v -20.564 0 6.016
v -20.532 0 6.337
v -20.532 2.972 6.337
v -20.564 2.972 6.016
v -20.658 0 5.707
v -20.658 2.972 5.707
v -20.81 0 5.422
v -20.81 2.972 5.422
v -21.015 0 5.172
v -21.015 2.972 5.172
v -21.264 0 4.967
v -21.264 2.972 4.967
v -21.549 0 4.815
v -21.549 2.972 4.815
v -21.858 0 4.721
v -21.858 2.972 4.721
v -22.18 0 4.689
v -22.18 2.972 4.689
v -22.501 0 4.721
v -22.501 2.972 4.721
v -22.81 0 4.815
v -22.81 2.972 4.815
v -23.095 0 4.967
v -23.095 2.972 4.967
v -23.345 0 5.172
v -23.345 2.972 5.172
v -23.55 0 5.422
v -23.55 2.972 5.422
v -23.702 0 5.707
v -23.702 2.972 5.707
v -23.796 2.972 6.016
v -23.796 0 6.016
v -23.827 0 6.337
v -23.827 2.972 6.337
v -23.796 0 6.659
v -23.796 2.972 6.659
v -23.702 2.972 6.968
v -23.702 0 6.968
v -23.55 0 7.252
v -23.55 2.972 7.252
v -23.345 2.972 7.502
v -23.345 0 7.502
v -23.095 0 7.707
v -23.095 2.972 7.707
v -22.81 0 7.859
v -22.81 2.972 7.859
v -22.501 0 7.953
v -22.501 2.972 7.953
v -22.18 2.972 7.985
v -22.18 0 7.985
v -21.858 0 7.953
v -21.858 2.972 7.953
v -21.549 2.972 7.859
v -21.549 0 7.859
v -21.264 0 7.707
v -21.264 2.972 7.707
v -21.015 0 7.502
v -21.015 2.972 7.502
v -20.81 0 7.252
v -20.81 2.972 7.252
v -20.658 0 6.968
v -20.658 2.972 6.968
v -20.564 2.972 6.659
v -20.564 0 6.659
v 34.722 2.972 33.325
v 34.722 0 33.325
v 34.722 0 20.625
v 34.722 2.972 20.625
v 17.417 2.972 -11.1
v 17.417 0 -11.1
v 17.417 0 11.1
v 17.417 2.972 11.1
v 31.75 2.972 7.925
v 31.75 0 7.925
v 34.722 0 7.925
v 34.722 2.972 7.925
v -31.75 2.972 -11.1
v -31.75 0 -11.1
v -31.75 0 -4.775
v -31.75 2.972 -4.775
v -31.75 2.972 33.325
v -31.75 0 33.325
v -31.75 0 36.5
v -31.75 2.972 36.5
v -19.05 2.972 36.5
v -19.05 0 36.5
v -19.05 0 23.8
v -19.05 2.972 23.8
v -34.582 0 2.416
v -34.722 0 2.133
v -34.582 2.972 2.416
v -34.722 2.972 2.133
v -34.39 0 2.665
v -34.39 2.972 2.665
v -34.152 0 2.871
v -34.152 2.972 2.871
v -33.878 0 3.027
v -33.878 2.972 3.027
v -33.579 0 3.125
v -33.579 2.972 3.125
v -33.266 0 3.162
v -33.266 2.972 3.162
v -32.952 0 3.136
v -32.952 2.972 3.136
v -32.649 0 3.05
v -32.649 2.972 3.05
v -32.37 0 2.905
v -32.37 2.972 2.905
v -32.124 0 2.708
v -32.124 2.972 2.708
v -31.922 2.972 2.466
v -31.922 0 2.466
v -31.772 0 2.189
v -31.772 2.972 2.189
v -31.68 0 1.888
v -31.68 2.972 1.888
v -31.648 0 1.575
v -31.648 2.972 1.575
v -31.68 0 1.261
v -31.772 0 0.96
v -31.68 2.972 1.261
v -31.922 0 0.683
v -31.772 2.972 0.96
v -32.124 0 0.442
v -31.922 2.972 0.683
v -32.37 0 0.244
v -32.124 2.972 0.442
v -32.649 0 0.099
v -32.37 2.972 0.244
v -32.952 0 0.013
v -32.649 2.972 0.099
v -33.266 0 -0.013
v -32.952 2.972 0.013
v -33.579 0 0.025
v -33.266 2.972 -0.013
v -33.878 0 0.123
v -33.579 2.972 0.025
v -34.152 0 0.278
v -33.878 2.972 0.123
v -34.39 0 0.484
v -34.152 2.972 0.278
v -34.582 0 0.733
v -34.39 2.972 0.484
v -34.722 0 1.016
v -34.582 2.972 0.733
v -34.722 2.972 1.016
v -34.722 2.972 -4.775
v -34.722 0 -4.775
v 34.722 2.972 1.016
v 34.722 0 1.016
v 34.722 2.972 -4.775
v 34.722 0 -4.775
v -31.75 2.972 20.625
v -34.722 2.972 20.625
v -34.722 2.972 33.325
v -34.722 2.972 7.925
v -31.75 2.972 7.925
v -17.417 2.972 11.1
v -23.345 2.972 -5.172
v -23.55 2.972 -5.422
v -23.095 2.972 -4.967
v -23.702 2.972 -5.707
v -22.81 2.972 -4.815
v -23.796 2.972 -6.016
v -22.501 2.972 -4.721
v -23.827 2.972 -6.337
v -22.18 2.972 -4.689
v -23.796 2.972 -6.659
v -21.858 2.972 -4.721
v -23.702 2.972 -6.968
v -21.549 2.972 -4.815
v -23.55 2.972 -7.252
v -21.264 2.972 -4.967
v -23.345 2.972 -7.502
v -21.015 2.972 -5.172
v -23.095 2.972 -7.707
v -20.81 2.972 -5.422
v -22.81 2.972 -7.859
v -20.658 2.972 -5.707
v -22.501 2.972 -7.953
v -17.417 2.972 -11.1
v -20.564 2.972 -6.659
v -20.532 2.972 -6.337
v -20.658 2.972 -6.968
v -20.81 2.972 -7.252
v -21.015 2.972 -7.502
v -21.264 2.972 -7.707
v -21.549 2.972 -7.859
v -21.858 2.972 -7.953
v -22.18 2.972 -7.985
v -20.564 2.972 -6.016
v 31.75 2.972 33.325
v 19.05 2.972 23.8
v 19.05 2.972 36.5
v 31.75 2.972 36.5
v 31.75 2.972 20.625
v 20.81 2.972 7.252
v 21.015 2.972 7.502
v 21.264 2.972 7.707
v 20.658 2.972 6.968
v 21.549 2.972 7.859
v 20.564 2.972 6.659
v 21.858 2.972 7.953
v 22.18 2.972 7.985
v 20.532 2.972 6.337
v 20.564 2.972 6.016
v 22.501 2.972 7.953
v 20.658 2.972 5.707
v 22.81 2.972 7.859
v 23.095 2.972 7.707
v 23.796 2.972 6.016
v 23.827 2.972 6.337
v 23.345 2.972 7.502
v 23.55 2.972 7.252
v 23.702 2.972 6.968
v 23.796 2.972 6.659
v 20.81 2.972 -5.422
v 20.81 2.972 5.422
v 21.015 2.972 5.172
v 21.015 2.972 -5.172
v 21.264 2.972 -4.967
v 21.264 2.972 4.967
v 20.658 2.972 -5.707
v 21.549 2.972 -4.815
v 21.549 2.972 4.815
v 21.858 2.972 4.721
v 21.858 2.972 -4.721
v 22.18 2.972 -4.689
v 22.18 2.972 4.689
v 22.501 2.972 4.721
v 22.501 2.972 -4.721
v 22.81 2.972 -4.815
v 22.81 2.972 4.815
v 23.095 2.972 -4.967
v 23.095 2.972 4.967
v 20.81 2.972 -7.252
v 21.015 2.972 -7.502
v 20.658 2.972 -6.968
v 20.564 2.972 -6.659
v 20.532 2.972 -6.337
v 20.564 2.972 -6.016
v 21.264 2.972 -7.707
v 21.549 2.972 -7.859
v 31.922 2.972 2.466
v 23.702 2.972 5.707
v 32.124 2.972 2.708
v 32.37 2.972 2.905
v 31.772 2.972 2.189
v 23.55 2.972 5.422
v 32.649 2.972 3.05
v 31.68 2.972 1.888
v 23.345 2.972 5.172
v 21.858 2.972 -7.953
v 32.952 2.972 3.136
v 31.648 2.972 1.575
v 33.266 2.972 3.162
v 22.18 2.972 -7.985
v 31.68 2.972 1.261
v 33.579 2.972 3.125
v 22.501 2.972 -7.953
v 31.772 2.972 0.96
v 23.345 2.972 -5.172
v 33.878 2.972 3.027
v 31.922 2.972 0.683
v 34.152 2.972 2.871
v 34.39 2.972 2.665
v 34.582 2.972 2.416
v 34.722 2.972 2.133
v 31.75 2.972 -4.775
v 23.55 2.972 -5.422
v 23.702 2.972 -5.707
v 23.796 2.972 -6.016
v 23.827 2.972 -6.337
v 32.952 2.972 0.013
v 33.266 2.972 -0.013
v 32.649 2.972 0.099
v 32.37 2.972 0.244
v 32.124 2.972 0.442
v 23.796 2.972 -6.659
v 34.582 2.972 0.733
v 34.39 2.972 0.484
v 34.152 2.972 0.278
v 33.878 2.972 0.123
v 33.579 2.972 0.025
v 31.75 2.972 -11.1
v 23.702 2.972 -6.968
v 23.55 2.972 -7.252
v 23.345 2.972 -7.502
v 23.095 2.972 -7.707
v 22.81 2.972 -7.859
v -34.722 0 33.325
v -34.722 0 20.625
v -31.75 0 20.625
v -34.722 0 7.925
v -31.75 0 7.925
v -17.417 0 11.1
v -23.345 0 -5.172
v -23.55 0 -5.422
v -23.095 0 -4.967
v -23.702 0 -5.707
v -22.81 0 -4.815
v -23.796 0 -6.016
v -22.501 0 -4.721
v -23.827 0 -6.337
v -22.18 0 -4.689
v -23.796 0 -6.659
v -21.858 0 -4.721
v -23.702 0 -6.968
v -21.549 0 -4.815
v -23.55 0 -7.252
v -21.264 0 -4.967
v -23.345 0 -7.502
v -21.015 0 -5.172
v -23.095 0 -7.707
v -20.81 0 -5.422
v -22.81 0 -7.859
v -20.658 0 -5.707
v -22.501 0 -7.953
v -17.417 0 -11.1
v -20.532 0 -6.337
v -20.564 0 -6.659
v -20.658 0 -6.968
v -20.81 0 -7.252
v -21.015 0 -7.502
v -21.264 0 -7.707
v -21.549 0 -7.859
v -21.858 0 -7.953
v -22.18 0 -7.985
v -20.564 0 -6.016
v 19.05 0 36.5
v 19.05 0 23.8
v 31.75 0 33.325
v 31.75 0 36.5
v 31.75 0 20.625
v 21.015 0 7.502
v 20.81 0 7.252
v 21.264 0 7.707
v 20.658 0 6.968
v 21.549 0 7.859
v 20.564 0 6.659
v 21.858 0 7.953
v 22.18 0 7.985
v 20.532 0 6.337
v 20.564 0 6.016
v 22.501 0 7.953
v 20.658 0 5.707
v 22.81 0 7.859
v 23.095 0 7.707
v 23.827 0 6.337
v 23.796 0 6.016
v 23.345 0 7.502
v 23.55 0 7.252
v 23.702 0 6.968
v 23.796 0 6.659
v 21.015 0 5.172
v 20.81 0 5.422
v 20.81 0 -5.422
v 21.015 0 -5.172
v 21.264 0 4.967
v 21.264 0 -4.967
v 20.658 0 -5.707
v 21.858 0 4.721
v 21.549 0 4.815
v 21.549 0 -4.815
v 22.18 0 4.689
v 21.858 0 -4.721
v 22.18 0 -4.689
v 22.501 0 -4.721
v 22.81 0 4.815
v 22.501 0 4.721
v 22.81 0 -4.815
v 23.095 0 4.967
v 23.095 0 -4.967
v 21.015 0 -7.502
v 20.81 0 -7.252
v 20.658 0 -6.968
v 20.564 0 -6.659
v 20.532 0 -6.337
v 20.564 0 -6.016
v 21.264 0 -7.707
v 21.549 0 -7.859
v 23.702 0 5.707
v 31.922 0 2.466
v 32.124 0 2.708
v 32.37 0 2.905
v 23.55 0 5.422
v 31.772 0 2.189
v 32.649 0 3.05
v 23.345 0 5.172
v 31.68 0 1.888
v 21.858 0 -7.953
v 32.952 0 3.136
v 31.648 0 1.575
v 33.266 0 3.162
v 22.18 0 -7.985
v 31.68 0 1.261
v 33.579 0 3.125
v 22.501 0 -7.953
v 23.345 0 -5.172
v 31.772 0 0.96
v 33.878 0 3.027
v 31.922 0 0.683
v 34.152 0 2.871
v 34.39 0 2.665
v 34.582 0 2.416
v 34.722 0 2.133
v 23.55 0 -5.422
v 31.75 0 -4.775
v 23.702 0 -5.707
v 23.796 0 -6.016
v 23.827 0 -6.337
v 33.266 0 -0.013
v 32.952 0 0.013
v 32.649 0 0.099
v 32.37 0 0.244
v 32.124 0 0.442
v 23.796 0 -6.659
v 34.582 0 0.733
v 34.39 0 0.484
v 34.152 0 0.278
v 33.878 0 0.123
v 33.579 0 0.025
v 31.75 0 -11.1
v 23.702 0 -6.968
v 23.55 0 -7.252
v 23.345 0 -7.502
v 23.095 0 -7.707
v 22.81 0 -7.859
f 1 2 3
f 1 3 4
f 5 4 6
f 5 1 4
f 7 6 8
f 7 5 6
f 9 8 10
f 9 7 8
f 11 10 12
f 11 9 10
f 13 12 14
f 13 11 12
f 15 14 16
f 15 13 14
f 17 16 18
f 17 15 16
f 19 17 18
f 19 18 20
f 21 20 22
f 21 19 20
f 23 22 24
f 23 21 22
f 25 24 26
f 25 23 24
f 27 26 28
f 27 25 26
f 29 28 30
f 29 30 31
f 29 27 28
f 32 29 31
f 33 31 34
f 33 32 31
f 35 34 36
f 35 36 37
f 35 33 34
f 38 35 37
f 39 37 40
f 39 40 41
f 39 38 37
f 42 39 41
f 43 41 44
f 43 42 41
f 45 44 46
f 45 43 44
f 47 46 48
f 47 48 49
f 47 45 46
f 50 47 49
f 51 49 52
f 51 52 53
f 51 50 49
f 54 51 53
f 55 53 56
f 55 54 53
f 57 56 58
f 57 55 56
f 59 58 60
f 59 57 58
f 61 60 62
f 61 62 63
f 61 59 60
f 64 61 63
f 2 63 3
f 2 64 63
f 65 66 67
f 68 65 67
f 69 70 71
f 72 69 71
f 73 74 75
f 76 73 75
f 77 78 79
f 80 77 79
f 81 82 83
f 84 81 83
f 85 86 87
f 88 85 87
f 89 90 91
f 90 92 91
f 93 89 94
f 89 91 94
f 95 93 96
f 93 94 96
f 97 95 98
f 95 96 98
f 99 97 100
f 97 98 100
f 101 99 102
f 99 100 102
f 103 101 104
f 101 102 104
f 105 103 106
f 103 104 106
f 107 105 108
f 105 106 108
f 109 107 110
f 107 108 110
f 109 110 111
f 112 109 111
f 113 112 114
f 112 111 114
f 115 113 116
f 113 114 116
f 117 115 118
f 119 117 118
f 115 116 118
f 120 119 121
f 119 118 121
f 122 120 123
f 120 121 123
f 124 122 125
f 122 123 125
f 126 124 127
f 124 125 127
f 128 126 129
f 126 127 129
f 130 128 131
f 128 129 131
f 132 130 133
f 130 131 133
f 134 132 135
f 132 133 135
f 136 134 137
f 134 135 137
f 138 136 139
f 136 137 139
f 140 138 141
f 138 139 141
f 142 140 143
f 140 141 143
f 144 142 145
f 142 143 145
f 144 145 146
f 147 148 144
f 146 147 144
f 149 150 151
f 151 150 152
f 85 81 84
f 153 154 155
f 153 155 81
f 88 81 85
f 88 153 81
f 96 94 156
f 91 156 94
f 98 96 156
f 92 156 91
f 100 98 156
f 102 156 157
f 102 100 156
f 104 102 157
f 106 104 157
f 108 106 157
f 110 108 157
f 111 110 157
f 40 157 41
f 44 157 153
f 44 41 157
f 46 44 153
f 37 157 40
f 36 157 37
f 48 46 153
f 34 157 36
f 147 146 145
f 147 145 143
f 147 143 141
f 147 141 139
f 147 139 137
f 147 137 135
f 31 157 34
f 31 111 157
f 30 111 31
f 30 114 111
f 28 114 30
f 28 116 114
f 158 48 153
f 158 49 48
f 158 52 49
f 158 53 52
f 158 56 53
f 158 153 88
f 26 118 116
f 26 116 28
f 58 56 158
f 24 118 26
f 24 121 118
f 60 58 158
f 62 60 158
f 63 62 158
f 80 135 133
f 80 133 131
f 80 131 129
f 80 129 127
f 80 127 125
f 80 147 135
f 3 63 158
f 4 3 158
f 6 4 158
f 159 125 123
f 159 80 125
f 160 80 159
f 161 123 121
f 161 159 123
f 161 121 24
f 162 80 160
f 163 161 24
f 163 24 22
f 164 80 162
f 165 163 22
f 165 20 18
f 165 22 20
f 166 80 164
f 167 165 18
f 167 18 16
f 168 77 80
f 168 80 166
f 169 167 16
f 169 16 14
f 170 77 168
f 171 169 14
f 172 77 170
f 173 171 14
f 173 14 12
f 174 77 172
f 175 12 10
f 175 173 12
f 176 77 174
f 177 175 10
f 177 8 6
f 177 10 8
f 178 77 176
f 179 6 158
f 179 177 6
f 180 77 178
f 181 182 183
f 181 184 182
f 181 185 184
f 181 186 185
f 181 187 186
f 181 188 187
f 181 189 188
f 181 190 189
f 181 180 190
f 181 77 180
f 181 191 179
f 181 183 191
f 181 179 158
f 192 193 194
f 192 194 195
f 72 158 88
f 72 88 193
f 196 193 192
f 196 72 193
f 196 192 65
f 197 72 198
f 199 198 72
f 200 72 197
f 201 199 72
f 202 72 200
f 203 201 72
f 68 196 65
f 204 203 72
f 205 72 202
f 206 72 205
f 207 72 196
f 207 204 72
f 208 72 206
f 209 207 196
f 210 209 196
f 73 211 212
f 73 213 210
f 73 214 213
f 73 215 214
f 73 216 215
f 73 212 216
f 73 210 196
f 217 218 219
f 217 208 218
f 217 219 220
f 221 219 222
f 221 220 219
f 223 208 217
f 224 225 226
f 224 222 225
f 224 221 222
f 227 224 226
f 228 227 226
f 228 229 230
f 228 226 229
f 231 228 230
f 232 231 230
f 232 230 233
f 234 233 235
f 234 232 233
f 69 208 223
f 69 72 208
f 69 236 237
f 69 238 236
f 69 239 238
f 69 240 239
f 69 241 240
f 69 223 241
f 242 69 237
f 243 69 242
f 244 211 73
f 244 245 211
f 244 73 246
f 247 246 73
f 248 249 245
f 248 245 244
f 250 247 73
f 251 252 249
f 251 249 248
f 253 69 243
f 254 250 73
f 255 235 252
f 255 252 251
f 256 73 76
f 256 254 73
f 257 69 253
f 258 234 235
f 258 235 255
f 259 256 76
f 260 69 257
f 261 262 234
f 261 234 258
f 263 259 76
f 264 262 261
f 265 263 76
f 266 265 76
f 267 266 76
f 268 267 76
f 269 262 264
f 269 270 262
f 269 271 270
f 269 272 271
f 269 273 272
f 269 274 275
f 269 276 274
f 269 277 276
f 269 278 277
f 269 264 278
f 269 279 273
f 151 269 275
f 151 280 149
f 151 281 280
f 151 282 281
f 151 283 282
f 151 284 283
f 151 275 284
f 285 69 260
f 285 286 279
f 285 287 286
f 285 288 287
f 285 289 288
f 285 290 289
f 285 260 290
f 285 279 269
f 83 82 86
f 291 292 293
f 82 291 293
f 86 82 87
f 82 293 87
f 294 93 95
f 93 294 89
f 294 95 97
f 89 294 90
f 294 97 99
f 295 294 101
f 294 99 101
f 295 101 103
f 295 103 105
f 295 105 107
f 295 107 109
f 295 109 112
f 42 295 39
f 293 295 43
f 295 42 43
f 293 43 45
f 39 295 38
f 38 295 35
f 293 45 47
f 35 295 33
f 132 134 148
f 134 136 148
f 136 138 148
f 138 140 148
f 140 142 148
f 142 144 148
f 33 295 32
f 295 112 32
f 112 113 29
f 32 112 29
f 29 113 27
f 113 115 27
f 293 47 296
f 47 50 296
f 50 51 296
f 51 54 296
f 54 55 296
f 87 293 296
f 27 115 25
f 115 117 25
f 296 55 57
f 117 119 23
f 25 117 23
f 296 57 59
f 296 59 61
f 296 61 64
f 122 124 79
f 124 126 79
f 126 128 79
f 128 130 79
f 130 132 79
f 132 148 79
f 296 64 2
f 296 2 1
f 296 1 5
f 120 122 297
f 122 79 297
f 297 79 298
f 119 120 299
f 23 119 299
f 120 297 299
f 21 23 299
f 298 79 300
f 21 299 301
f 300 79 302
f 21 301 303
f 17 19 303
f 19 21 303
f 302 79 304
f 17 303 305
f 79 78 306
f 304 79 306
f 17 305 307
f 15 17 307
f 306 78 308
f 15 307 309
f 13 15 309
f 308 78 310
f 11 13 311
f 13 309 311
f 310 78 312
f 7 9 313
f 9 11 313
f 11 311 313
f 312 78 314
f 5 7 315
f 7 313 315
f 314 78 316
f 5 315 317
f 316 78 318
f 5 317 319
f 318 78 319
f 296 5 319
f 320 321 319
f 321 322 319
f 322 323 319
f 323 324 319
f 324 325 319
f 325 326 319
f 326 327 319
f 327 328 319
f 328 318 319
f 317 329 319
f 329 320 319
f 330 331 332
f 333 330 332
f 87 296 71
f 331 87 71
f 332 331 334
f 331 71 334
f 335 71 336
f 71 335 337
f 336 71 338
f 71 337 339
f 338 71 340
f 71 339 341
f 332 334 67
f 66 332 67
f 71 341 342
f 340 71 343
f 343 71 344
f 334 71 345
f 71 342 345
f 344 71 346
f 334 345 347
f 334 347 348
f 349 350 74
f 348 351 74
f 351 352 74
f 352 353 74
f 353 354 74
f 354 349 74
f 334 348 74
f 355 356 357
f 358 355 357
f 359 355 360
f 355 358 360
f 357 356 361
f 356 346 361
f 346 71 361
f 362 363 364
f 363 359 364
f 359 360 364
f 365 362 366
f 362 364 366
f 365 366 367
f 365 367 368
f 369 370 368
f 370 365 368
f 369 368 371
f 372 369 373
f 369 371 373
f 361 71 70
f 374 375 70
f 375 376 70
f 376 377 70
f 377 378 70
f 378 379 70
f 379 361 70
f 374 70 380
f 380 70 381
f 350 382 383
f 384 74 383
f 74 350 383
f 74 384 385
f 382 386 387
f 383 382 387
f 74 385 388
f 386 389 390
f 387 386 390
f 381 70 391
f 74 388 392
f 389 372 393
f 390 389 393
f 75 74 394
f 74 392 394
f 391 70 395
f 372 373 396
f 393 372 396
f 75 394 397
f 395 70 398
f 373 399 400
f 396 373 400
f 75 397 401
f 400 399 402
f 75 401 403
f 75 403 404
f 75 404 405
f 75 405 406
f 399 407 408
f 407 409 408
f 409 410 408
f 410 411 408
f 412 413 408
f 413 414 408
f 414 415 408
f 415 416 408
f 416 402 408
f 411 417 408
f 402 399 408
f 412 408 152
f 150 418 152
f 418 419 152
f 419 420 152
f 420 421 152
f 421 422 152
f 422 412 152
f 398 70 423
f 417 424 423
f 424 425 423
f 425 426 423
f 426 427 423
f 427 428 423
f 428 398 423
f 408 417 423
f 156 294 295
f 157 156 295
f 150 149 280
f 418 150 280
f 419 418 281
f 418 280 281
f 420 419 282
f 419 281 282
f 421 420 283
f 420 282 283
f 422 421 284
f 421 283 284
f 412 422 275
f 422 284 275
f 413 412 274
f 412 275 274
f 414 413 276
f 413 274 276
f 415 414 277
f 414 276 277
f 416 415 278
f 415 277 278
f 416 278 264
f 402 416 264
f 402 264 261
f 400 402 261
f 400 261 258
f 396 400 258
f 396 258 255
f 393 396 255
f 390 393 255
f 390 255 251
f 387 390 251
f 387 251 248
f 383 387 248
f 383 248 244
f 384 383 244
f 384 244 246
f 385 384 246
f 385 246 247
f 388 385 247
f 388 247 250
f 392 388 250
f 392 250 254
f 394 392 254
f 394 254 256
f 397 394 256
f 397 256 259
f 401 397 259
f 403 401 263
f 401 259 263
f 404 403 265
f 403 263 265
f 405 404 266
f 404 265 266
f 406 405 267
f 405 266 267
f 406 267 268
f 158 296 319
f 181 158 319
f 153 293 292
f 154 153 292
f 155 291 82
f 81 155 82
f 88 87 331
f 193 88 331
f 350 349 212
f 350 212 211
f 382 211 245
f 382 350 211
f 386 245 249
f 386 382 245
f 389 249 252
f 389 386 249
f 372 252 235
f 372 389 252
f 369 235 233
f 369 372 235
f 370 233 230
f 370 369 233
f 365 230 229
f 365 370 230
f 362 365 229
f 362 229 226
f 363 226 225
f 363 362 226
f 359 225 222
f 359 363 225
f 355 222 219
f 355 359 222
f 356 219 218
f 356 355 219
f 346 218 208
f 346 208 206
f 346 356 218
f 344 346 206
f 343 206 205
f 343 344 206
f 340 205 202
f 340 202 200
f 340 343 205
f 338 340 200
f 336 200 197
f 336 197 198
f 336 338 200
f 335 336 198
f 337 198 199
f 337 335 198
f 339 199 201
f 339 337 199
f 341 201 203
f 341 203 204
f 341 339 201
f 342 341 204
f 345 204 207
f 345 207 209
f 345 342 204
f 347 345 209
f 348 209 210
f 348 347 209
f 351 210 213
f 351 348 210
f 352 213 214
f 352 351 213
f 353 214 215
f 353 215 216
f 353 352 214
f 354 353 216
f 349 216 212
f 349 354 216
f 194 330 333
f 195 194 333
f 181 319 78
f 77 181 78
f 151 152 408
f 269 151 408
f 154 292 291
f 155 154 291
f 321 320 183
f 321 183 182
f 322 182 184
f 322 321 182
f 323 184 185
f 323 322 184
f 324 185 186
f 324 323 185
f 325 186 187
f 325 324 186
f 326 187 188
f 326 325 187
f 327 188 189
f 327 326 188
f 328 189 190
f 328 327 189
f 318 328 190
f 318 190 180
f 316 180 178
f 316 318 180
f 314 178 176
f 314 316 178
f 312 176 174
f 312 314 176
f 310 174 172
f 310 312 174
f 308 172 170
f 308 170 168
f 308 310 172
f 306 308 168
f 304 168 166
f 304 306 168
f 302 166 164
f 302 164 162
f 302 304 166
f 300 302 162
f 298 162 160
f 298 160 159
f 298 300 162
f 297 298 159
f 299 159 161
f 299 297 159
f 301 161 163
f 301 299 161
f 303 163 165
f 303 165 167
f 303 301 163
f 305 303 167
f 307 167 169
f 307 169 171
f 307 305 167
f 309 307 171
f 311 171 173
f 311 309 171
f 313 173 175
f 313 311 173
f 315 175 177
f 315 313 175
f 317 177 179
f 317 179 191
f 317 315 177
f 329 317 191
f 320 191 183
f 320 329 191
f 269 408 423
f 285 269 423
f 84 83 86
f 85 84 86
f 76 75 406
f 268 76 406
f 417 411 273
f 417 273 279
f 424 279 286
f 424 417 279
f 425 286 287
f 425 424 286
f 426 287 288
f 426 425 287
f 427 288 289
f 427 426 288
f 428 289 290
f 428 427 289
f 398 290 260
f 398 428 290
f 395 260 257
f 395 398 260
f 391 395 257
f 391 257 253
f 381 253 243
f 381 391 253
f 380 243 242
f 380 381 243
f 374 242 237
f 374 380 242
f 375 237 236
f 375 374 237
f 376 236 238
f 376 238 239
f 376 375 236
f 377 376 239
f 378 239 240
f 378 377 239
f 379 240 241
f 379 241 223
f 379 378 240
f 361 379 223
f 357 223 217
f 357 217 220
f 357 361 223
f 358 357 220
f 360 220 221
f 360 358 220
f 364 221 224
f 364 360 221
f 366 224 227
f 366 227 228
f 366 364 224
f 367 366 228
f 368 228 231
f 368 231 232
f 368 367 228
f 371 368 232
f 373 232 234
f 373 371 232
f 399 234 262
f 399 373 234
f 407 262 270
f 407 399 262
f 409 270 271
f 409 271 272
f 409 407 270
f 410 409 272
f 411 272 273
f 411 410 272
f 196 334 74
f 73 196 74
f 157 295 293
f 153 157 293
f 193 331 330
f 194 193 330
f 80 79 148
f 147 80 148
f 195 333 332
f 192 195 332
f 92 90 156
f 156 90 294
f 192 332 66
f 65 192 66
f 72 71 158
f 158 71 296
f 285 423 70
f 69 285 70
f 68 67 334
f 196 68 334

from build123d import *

# Parameters (mm, degrees)
SKETCH1_R           = 1.647641354
BOSS_EXTRUDE1_DEPTH = 2.9718
SKETCH2_R           = 1.5875
CUT_EXTRUDE1_DEPTH  = 3.9718


with BuildPart() as part:
    # Sketch1 → Boss-Extrude1 (new body)
    with BuildSketch(Plane(origin=(0, 0, 0), x_dir=(1, 0, 0), z_dir=(0, 1, 0))):
        Polygon((-17.417287452, 11.099582129), (-31.75, 11.099582129), (-31.75, 4.775417871), (-34.7218, 4.775417871), (-34.7218, -7.924582129), (-31.75, -7.924582129), (-31.75, -20.624582129), (-34.7218, -20.624582129), (-34.7218, -33.324582129), (-31.75, -33.324582129), (-31.75, -36.499582129), (-19.05, -36.499582129), (-19.05, -23.799582129), (19.05, -23.799582129), (19.05, -36.499582129), (31.75, -36.499582129), (31.75, -33.324582129), (34.7218, -33.324582129), (34.7218, -20.624582129), (31.75, -20.624582129), (31.75, -7.924582129), (34.7218, -7.924582129), (34.7218, 4.775417871), (31.75, 4.775417871), (31.75, 11.099582129), (17.417287452, 11.099582129), (17.417287452, -11.099582129), (-17.417287452, -11.099582129), align=None)
        with Locations((-22.179787452, -6.337082129)):
            Circle(SKETCH1_R, mode=Mode.SUBTRACT)
        with Locations((-22.179787452, 6.337082129)):
            Circle(SKETCH1_R, mode=Mode.SUBTRACT)
        with Locations((22.179787452, 6.337082129)):
            Circle(SKETCH1_R, mode=Mode.SUBTRACT)
        with Locations((22.179787452, -6.337082129)):
            Circle(SKETCH1_R, mode=Mode.SUBTRACT)
    extrude(amount=BOSS_EXTRUDE1_DEPTH)

    # Sketch2 → Cut-Extrude1 (cut, through all)
    with BuildSketch(Plane(origin=(0, 2.9718, 0), x_dir=(1, 0, 0), z_dir=(0, 1, 0))):
        with Locations((-33.2359, -1.574582129)):
            Circle(SKETCH2_R)
        with Locations((33.2359, -1.574582129)):
            Circle(SKETCH2_R)
    extrude(amount=-CUT_EXTRUDE1_DEPTH, mode=Mode.SUBTRACT)


solid = part.part
